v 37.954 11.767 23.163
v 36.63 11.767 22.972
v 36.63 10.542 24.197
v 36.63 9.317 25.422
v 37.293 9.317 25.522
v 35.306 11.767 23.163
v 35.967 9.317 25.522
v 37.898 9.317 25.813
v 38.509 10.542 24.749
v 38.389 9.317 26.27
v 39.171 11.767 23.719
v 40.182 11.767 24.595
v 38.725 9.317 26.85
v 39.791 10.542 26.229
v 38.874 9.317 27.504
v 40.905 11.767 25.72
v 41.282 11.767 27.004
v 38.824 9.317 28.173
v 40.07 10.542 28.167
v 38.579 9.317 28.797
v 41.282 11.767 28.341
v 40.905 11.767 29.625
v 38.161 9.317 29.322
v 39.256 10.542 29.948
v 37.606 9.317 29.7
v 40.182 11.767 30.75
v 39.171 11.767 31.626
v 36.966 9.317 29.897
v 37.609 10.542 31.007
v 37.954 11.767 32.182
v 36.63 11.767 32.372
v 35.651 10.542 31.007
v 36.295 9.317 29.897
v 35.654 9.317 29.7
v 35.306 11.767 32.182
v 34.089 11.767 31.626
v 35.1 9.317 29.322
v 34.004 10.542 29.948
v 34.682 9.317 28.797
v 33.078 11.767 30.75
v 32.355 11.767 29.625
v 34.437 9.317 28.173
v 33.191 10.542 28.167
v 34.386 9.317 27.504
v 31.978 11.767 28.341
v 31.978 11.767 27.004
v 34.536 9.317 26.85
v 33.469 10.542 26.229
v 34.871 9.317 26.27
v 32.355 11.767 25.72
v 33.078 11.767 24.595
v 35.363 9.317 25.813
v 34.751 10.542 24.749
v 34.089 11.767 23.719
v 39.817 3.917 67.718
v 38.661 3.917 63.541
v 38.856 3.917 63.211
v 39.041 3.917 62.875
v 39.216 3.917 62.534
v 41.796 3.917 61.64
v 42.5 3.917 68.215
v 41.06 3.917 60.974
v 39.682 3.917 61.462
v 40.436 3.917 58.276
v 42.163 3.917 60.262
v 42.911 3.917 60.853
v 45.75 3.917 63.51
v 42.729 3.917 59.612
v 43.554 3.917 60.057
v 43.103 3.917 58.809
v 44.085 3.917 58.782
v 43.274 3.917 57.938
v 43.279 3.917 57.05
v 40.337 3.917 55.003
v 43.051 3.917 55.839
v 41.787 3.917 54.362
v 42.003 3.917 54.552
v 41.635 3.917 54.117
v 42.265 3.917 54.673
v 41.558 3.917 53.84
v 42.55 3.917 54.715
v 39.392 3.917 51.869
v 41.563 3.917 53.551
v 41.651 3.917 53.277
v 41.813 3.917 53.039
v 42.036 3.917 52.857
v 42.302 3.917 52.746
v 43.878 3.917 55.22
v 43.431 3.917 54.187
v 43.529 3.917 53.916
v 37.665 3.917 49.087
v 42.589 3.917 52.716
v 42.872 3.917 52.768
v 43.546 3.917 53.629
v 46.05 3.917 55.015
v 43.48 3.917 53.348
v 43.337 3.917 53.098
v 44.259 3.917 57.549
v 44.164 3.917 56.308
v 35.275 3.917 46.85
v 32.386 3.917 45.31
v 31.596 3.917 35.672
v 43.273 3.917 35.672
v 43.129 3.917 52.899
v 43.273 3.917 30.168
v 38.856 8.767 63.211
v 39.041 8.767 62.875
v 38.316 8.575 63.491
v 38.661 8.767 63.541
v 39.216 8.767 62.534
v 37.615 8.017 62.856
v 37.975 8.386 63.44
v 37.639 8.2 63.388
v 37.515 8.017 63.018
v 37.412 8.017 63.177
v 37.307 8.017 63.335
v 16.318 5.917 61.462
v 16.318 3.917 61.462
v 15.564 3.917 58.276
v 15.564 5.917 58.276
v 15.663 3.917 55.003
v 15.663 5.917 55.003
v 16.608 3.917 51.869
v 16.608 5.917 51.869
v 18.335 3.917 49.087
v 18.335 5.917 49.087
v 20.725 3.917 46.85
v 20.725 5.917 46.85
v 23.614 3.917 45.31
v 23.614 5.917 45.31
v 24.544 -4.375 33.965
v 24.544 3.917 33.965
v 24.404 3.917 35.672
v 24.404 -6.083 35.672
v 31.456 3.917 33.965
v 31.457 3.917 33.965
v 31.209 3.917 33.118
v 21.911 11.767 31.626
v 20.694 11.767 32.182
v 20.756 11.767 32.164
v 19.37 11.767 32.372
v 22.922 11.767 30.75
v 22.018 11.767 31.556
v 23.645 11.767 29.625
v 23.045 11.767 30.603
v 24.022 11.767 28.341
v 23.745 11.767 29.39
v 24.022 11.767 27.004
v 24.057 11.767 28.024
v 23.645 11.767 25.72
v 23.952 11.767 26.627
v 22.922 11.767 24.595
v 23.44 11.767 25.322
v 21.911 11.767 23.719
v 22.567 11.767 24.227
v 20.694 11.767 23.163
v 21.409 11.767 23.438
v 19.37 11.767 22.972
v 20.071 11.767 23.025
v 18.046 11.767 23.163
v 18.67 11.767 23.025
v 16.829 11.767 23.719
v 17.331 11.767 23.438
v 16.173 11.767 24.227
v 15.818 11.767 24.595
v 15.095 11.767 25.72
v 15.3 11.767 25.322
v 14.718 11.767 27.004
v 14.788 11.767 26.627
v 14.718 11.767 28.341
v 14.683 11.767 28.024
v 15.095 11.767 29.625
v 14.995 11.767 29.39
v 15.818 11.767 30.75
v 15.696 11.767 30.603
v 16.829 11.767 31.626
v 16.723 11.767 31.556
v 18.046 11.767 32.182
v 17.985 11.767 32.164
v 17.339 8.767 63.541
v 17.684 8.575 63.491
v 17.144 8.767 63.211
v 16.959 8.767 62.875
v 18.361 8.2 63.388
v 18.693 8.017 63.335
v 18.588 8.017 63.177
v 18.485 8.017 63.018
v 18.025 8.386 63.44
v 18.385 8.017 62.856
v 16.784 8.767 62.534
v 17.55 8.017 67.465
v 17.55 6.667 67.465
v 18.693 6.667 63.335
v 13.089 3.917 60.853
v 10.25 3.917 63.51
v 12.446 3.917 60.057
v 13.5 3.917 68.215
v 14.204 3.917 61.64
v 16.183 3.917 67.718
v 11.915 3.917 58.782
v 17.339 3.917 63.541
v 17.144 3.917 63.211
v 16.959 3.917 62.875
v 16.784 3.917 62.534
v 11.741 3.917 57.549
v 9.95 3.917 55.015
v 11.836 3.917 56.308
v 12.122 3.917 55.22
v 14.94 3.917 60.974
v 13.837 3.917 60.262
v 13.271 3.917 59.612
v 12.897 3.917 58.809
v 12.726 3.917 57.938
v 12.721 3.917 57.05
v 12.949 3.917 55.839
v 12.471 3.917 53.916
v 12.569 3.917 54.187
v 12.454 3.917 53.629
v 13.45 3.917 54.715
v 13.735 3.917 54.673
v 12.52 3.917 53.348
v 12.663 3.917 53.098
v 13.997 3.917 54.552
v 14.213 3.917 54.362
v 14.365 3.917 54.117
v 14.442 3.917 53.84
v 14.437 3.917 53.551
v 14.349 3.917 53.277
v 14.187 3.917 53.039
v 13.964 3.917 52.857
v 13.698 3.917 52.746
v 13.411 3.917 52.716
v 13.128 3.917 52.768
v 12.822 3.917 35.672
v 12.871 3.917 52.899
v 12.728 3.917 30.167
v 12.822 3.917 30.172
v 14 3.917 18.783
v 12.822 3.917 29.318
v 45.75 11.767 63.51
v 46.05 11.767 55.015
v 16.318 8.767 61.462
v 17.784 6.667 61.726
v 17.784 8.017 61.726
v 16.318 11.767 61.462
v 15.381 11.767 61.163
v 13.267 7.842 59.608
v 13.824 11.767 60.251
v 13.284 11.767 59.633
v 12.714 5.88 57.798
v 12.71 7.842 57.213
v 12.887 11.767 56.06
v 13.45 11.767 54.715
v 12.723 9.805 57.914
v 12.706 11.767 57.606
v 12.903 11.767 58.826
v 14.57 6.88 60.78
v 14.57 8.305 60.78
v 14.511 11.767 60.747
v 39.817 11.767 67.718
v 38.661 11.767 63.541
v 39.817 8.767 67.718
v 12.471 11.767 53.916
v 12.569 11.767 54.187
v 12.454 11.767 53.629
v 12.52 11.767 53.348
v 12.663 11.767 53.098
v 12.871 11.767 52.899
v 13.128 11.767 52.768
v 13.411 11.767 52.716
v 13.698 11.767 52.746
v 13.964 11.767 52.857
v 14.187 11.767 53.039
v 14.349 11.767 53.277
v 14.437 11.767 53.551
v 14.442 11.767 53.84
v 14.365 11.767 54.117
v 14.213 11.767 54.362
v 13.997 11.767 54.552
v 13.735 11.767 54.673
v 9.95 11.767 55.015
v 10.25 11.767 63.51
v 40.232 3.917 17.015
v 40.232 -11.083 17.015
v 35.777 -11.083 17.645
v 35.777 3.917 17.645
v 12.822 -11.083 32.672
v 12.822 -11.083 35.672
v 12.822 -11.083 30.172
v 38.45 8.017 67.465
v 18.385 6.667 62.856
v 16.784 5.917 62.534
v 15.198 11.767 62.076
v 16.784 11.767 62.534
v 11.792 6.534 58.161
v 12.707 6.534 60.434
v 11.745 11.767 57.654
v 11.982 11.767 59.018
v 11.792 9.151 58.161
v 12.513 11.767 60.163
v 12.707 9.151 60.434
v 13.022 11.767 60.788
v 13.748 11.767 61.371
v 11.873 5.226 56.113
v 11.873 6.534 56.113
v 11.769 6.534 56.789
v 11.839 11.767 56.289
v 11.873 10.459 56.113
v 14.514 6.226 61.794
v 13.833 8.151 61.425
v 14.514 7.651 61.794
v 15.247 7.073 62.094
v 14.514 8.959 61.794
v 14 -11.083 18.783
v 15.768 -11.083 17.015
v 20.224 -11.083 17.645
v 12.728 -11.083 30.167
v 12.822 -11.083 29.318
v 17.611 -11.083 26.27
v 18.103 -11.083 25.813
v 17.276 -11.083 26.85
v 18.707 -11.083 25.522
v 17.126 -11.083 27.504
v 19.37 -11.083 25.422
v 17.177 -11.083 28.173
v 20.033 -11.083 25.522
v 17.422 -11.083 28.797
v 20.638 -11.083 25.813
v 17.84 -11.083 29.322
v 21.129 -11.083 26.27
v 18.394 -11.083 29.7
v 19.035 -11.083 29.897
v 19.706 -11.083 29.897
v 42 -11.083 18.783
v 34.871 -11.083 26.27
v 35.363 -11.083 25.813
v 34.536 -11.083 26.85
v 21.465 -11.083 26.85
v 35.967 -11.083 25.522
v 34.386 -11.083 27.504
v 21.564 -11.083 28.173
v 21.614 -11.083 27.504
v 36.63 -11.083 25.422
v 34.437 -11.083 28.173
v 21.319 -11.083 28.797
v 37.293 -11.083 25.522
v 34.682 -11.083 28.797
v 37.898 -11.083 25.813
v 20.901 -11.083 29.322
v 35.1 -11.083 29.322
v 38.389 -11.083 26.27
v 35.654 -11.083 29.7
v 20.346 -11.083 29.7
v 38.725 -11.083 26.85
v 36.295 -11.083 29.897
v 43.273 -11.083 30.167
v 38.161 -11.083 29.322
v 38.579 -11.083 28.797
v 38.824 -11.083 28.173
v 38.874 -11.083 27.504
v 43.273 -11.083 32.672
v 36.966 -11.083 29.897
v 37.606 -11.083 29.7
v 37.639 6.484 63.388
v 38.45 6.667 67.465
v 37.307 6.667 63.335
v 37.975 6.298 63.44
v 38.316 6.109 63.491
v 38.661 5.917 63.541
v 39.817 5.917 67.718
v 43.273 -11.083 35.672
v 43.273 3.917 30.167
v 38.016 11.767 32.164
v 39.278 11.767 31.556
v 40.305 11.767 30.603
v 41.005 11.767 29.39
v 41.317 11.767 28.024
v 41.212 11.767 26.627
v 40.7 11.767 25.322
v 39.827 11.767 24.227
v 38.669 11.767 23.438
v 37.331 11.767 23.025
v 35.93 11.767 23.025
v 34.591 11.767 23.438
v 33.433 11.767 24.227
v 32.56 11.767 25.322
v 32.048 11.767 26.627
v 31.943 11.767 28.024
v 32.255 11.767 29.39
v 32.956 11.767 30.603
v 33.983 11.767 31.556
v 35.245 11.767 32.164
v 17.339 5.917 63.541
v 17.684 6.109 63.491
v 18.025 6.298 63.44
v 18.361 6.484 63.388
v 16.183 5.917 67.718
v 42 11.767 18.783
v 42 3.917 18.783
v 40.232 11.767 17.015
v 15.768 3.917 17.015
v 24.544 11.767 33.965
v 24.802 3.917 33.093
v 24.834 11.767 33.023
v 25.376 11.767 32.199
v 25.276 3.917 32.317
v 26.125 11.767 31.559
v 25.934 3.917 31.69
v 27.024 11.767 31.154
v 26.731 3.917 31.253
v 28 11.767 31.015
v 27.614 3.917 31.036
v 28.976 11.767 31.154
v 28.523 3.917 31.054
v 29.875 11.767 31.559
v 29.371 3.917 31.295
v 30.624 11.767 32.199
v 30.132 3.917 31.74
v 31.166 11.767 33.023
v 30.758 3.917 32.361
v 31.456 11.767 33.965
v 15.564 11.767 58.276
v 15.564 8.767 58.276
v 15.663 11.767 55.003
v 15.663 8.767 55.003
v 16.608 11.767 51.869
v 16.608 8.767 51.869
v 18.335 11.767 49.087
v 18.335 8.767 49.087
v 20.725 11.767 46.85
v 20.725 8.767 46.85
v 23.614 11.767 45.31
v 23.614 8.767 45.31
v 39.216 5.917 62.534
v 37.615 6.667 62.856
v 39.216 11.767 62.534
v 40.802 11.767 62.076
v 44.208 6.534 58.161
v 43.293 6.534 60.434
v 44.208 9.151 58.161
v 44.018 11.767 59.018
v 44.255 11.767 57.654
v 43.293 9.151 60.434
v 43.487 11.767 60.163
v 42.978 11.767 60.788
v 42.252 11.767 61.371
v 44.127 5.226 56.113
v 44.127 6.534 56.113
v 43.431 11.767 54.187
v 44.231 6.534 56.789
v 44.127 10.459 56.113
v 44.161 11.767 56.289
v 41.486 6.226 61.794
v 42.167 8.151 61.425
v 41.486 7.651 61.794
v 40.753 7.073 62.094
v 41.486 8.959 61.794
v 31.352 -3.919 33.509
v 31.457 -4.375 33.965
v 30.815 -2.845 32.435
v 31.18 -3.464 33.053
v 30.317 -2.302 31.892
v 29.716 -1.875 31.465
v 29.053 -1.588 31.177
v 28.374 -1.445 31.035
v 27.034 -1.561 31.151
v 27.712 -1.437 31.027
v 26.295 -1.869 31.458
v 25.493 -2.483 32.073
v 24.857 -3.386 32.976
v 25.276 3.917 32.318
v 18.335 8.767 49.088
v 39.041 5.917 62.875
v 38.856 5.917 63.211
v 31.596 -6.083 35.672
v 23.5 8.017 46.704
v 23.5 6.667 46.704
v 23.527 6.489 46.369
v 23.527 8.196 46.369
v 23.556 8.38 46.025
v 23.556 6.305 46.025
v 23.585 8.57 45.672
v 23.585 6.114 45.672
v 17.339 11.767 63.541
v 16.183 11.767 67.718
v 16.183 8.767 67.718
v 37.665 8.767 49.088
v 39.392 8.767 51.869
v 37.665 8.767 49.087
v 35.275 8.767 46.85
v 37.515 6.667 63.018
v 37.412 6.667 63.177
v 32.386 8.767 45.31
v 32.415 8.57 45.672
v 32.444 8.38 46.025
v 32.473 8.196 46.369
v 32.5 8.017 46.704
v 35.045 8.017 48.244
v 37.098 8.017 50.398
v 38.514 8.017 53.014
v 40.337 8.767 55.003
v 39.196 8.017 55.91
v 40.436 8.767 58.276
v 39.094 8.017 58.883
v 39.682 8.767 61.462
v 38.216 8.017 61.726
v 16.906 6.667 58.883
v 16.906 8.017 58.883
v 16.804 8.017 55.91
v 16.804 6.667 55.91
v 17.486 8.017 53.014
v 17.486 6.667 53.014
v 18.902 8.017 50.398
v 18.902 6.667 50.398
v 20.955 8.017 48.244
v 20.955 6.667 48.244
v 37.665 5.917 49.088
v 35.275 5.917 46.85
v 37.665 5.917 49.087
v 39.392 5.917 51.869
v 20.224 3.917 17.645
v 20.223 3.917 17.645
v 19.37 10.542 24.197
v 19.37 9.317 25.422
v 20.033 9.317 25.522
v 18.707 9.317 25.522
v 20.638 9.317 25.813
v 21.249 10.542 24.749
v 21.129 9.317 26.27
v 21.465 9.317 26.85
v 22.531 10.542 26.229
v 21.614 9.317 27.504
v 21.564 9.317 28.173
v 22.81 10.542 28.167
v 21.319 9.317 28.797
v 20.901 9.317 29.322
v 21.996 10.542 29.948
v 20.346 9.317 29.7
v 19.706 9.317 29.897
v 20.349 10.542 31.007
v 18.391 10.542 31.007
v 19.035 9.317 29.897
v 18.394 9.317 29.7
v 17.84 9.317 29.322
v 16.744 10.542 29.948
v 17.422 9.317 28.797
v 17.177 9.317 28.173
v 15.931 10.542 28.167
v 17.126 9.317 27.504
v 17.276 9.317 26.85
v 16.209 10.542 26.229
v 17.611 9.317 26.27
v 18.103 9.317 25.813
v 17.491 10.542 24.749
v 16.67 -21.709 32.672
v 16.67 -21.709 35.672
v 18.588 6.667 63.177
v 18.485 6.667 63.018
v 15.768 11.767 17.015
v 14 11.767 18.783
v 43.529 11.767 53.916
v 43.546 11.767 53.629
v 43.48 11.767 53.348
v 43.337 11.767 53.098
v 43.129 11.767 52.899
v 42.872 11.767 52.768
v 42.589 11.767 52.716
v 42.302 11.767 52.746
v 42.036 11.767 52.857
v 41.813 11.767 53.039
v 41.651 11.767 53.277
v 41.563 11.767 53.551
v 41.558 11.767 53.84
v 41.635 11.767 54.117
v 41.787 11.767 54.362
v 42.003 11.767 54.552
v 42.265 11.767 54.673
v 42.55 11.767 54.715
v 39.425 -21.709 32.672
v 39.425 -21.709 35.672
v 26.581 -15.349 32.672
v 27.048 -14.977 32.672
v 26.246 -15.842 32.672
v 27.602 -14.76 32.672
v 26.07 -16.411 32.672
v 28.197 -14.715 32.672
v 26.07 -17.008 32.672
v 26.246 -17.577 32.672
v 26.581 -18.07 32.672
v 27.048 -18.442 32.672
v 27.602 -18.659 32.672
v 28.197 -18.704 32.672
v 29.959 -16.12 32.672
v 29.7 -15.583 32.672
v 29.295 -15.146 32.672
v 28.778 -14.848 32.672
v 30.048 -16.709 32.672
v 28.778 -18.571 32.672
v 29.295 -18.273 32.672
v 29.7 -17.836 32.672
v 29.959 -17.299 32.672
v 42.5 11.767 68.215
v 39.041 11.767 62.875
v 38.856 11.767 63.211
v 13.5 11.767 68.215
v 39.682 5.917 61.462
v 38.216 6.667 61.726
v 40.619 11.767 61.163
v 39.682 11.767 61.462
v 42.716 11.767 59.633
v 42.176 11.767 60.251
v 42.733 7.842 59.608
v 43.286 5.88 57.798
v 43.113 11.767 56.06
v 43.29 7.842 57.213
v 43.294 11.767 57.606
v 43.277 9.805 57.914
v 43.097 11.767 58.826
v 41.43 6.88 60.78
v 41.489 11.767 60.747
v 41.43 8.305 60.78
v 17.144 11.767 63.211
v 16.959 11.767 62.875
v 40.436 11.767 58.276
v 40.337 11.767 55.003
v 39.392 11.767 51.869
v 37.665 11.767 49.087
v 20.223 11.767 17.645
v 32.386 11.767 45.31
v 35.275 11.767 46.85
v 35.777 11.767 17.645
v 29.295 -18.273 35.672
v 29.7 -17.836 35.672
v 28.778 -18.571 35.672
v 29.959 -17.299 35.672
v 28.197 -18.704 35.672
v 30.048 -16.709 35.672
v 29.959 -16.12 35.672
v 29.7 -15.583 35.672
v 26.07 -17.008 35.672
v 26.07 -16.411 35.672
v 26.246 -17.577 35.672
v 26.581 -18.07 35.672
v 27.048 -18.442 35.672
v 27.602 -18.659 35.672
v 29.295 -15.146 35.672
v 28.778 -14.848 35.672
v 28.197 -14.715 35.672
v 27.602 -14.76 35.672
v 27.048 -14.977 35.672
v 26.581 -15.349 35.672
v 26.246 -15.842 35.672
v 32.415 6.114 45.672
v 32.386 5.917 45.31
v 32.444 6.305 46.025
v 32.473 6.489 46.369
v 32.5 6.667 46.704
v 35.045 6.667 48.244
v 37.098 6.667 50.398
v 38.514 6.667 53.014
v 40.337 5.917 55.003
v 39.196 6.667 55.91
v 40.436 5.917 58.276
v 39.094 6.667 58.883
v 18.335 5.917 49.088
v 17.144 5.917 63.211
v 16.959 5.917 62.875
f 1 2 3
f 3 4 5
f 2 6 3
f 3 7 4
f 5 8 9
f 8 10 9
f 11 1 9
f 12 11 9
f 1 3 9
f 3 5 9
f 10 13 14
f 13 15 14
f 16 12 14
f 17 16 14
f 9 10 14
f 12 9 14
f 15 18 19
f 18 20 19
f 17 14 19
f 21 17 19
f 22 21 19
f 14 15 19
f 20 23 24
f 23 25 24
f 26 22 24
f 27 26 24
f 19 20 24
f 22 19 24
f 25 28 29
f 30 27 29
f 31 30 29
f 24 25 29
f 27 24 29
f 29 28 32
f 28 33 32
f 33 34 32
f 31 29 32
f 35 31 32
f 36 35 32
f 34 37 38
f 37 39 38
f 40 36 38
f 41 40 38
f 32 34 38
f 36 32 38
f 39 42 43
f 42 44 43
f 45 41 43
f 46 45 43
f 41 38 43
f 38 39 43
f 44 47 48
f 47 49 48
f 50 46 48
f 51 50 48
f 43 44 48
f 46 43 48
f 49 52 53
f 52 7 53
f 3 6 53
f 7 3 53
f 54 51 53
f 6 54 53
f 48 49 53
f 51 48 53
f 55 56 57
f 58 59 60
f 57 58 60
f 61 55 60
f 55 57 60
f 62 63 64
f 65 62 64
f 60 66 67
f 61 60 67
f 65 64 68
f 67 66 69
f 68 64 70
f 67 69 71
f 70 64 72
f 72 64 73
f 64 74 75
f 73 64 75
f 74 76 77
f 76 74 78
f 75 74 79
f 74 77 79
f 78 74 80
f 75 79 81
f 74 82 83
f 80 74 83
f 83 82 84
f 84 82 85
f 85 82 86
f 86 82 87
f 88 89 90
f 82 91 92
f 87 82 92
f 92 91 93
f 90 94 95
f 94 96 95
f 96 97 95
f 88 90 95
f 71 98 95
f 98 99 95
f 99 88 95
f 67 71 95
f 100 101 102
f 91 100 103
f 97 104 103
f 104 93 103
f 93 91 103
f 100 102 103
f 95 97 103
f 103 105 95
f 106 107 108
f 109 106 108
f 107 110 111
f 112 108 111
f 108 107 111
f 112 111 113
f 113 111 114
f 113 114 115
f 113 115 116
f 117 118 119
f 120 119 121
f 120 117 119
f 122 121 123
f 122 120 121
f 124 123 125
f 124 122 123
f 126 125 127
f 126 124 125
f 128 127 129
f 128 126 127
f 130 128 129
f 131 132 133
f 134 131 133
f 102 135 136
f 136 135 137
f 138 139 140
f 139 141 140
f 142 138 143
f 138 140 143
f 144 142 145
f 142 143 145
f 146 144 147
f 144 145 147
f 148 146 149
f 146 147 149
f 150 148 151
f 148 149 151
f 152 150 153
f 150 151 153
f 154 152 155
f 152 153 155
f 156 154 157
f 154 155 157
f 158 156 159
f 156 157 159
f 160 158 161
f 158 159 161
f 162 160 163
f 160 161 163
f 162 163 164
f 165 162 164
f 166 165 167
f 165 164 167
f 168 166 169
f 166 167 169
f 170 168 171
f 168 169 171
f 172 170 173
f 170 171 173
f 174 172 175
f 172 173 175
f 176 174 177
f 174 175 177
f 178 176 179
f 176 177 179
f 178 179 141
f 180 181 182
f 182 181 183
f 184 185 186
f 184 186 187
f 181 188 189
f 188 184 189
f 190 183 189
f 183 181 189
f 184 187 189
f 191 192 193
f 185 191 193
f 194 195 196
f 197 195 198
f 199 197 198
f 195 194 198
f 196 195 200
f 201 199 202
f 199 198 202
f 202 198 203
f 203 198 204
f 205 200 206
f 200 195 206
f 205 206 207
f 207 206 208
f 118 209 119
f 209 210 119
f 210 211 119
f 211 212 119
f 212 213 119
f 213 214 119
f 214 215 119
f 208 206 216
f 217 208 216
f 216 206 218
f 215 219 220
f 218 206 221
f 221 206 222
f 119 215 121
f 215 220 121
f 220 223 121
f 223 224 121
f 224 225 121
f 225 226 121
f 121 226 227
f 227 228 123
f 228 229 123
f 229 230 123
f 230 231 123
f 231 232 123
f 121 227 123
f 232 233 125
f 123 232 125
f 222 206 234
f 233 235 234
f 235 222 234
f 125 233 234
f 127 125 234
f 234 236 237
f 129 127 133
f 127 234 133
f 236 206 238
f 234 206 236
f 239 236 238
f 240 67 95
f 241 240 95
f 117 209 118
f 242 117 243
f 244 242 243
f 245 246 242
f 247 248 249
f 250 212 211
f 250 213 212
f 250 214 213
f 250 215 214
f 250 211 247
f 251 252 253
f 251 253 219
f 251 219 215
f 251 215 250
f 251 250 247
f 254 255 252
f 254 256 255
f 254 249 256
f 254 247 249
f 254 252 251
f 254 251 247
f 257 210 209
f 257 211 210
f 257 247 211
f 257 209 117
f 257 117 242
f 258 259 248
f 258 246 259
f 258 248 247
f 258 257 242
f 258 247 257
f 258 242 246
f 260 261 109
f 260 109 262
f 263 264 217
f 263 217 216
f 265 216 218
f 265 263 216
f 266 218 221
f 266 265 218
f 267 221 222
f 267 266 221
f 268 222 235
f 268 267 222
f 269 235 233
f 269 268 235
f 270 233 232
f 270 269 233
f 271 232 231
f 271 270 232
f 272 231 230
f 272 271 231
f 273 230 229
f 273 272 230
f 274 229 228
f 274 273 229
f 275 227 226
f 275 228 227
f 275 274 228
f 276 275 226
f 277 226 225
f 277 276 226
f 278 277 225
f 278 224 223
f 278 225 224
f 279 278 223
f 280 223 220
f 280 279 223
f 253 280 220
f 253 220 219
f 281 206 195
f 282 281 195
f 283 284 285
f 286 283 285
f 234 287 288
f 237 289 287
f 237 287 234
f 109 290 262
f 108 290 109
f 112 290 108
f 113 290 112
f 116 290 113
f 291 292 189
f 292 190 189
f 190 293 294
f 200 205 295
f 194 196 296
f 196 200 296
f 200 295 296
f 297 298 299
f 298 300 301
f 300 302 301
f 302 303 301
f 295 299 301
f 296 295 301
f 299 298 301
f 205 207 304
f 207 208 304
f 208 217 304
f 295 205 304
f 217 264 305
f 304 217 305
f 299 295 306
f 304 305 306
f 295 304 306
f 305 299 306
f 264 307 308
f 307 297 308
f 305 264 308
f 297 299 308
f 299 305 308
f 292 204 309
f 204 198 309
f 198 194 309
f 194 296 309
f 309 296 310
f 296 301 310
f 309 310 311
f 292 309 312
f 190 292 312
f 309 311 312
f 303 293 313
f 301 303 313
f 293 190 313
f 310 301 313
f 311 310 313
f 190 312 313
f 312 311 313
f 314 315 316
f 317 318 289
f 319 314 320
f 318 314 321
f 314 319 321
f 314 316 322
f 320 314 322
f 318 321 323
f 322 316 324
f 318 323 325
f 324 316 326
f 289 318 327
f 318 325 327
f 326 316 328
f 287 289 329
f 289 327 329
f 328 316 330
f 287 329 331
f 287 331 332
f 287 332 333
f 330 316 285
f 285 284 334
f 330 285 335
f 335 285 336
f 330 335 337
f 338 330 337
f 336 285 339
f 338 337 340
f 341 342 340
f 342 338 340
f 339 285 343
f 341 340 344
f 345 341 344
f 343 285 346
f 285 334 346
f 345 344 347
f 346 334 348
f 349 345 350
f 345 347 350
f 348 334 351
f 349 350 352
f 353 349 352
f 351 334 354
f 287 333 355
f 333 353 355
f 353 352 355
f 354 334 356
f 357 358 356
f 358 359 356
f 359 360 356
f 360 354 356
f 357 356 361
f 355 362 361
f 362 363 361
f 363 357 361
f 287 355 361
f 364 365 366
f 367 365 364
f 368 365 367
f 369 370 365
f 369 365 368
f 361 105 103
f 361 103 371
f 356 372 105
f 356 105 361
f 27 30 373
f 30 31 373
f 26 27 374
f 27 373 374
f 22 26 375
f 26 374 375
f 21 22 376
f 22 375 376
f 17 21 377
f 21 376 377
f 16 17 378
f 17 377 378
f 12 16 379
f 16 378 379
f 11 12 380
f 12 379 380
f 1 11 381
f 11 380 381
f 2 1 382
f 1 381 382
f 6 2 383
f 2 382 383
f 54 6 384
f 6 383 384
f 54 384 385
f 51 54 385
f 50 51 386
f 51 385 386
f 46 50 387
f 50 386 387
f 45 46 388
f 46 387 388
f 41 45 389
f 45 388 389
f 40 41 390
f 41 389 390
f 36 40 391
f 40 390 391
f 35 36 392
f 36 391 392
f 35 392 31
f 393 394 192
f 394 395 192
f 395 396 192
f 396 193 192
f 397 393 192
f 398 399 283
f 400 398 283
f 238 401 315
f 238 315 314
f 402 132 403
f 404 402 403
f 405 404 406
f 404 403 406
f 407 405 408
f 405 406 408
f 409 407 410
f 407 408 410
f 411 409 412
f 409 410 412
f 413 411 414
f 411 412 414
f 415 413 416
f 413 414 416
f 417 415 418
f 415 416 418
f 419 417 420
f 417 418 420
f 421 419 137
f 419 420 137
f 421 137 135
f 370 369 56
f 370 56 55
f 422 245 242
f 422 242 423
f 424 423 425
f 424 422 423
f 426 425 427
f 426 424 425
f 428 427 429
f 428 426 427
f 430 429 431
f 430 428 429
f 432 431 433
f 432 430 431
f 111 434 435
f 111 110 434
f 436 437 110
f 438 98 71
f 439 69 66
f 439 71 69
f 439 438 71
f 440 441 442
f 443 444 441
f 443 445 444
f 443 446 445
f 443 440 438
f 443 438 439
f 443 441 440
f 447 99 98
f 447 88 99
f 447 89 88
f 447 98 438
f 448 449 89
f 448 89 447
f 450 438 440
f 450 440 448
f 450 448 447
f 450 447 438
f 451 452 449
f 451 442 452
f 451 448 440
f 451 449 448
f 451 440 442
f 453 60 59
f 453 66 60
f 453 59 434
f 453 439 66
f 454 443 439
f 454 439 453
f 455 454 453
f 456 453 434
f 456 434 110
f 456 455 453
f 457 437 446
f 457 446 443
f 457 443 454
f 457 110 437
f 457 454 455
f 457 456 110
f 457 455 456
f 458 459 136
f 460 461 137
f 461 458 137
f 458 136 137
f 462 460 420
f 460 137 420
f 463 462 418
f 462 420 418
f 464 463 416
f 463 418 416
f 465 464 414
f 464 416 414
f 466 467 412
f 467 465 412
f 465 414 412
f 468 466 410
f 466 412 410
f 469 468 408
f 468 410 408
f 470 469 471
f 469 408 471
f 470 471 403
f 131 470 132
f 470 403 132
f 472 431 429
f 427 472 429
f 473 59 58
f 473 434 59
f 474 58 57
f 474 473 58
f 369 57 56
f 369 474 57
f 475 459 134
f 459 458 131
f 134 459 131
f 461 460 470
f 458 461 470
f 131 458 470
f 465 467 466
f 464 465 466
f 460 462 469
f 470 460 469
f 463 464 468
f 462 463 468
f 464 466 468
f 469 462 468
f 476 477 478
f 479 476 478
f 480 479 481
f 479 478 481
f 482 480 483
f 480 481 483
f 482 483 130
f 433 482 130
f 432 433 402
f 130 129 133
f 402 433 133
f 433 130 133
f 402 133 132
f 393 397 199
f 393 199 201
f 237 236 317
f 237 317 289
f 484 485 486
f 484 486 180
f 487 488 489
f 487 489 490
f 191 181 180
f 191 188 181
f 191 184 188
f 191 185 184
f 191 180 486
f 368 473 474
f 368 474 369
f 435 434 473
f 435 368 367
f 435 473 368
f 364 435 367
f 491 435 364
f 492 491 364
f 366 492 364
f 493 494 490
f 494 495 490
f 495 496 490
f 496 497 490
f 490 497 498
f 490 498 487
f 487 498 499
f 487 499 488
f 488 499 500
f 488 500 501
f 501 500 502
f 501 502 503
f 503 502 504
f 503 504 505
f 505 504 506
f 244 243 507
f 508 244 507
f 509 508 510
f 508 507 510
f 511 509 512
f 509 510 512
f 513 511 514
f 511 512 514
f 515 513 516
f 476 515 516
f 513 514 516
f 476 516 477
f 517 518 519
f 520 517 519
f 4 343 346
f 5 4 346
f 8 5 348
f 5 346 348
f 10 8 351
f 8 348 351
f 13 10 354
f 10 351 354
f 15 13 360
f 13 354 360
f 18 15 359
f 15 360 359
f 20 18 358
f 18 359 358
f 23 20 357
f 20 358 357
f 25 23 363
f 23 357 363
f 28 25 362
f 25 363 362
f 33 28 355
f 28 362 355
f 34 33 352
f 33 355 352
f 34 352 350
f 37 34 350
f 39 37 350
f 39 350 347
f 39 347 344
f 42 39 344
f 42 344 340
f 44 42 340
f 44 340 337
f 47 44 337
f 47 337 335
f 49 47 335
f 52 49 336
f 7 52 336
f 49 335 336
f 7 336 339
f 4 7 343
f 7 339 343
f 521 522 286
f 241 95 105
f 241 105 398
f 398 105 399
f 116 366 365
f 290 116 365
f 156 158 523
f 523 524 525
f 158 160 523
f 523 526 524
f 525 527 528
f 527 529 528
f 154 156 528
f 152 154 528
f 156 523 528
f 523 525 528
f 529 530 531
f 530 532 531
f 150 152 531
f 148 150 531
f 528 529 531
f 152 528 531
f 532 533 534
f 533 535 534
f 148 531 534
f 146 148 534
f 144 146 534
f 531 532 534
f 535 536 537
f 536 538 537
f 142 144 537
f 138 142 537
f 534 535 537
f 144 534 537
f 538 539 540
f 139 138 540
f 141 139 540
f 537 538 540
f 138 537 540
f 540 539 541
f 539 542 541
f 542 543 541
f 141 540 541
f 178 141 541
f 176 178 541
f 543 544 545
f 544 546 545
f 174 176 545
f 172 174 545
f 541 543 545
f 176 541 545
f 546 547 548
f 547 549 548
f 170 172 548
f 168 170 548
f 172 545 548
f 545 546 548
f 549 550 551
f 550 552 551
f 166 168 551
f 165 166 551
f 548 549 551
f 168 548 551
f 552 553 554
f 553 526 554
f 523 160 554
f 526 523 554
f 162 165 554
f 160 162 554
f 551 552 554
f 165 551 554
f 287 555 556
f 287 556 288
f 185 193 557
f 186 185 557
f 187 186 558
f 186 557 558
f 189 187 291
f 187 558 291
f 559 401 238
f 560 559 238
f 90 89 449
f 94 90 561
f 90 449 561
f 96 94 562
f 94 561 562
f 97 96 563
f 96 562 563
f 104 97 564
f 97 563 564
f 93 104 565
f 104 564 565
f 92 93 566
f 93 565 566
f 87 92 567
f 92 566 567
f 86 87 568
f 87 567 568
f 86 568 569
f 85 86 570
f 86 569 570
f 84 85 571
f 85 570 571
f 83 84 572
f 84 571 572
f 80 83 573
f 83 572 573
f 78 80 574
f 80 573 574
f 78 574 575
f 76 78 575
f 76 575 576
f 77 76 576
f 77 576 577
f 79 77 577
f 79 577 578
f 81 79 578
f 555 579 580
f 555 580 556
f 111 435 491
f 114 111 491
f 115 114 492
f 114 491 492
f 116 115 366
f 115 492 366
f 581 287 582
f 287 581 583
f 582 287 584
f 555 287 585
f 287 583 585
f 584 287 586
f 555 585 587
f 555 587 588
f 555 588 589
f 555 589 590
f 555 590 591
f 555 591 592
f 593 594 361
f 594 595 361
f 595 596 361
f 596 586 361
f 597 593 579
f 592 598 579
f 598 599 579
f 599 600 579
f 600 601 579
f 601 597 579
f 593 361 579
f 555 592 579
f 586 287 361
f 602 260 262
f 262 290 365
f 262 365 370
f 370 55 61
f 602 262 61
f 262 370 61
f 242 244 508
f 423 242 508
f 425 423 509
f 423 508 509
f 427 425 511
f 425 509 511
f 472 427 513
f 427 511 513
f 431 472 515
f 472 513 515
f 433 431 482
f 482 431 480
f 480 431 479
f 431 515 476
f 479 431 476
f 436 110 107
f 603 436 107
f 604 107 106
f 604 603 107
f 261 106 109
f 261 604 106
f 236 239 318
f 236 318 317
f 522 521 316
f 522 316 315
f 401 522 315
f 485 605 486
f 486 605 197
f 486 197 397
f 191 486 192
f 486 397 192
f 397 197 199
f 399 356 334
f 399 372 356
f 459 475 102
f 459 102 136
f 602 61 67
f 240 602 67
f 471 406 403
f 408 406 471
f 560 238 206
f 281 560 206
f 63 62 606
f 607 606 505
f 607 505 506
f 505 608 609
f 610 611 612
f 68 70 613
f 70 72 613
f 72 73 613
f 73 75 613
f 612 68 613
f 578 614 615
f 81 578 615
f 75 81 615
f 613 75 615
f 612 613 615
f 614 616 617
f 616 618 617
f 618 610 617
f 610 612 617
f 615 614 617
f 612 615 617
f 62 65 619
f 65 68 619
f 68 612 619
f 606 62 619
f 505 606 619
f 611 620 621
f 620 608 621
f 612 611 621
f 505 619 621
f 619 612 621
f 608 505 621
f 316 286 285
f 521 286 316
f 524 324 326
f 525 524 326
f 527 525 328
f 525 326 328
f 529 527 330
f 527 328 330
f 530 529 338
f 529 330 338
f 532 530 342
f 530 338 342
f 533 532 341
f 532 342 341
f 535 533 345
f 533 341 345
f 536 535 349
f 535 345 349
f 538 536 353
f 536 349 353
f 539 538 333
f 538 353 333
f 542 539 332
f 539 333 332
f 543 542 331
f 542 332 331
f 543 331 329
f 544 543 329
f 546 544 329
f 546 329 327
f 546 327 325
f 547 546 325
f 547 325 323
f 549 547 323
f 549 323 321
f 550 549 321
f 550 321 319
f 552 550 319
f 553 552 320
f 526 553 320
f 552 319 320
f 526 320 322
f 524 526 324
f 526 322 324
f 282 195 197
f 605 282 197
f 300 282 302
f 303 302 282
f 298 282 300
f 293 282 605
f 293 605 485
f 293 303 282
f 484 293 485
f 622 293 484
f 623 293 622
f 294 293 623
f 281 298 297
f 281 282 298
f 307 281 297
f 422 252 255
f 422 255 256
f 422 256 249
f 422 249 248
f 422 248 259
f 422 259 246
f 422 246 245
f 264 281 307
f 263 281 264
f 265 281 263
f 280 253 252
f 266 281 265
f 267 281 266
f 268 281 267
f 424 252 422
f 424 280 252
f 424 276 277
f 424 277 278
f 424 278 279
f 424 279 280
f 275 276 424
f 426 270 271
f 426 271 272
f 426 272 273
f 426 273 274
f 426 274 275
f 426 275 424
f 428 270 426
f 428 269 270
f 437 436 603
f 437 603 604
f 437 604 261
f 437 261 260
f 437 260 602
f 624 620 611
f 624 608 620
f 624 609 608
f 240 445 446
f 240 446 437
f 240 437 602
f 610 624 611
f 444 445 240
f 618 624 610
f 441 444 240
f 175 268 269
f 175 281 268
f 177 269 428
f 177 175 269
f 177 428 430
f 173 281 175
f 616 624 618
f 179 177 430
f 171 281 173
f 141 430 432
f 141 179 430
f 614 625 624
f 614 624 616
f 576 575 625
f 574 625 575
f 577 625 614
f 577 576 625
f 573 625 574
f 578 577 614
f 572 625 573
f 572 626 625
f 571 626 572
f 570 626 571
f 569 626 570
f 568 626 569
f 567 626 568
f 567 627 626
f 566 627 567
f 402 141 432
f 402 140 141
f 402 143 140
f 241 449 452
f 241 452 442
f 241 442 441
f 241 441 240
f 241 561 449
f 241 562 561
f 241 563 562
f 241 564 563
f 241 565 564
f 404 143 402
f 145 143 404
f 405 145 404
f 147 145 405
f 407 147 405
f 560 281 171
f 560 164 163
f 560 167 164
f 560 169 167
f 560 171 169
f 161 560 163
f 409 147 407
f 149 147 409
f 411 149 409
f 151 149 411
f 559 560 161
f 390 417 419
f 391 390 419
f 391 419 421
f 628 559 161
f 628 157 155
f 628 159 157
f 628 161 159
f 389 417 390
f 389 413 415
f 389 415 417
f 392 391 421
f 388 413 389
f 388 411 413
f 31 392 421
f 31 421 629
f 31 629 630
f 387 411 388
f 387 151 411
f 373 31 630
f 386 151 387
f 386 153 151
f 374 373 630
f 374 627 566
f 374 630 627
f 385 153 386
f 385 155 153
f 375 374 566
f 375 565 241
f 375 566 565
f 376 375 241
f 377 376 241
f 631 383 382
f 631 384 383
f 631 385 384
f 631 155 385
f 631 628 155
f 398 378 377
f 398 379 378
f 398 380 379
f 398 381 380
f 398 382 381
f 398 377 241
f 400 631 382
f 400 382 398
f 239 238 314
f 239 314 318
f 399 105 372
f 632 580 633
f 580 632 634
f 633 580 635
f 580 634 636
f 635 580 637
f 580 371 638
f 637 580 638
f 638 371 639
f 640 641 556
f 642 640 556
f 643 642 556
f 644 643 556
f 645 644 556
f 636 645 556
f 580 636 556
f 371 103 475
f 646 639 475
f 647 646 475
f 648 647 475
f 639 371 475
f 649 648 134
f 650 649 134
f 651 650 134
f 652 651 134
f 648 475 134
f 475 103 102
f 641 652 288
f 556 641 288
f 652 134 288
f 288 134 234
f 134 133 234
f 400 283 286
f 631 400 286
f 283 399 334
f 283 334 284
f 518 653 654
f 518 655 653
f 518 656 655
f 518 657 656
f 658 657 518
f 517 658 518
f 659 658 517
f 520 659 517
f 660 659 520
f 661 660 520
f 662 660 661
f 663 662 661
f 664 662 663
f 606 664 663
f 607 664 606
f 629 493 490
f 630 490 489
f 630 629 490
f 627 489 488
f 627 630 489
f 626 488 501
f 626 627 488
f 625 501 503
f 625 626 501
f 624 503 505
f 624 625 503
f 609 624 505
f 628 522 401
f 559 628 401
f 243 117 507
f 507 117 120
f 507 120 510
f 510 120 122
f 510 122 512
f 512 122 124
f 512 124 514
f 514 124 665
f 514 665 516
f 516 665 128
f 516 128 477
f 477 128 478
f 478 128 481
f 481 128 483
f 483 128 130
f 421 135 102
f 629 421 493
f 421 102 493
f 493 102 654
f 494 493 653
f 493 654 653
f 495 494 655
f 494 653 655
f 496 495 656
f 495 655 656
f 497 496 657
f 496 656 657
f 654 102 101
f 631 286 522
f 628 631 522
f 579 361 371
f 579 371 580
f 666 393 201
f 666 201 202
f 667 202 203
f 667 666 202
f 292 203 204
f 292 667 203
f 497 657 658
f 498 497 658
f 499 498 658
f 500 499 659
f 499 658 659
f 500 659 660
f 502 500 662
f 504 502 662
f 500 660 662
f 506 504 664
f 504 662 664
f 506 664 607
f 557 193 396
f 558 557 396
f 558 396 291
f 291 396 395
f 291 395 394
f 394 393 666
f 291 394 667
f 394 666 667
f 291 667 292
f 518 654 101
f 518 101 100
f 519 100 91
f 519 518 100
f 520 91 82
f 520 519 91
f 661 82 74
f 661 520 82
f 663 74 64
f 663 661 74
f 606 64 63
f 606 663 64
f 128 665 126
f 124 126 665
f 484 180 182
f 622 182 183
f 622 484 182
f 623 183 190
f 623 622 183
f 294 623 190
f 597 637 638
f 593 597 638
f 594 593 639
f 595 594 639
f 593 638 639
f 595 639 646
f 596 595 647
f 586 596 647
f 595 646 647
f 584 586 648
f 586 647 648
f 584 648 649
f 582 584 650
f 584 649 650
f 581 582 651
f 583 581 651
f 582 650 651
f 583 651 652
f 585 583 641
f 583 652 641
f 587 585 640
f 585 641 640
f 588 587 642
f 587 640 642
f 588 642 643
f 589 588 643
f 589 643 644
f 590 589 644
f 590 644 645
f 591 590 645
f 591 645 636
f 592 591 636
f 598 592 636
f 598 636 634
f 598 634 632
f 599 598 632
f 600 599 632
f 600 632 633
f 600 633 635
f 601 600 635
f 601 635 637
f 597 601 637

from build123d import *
from OCP.BRepFilletAPI import BRepFilletAPI_MakeChamfer

# Parameters (mm, degrees)
EXTRUDE_1_DEPTH                                 = 15.7
CUT_EXTRUDE_5_DEPTH                             = 6
CUT_EXTRUDE_START                               = -4
CUT_EXTRUDE_6_DEPTH                             = 4
CHAMFER_2_SIZE                                  = 2.5
CHAMFER_2_SIZE_2                                = 1.5
CHAMFER_3_SIZE                                  = 2.5
CHAMFER_3_SIZE_2                                = 1.5
CHAMFER_4_SIZE                                  = 2.5
CHAMFER_4_SIZE_2                                = 1.5
CHAMFER_5_SIZE                                  = 1.5
CHAMFER_5_SIZE_2                                = 2.5
CUT_EXTRUDE_7_DEPTH                             = 20
SCALE1_SCALE                                    = 0.5
BOSS_EXTRUDE2_DEPTH                             = 15
CSK_FOR_M4_FLAT_HEAD_MACHINE_SCREW1_D           = 4.5
CSK_FOR_M4_FLAT_HEAD_MACHINE_SCREW1_DEPTH       = 28.648063607
CSK_FOR_M4_FLAT_HEAD_MACHINE_SCREW1_CSINK_D     = 9.4
CSK_FOR_M4_FLAT_HEAD_MACHINE_SCREW1_CSINK_ANGLE = 90
CSK_FOR_M4_FLAT_HEAD_MACHINE_SCREW1_TIP         = 1.351936393
BOSS_EXTRUDE3_DEPTH                             = 3
BOSS_EXTRUDE3_DEPTH_BACK                        = 2.50573
CUT_EXTRUDE1_DEPTH                              = 79.961726409
CUT_EXTRUDE2_DEPTH                              = 5
CHAMFER1_START                                  = -1.425343225
CHAMFER1_DEPTH                                  = 0.342542044
CHAMFER1_START_2                                = -6.082801281
CHAMFER1_2_DEPTH                                = 4.657458056
CHAMFER1_START_3                                = 17
CHAMFER1_3_DEPTH                                = 3.923043383
CUT_EXTRUDE3_REACH                              = 62.423
SKETCH9_R                                       = 2


with BuildPart() as part:
    # Эскиз1 → Бобышка-Вытянуть1 (new body)
    with BuildSketch(Plane(origin=(0, 0, 0), x_dir=(1, 0, 0), z_dir=(0, 1, 0))):
        with BuildLine():
            Line((19, -55.842875467), (21.087010541, -30.364203971))
            ThreePointArc((21.087010541, -30.364203971), (28, -24.464466094), (34.912989459, -30.364203971))
            Line((34.912989459, -30.364203971), (37, -55.842875467))
            ThreePointArc((37, -55.842875467), (49.615065571, -70.216351148), (46.614482007, -89.103732671))
            Line((46.614482007, -89.103732671), (48.9, -97.364070254))
            Line((48.9, -97.364070254), (57, -98.864070254))
            Line((57, -98.864070254), (63.5, -89.453874559))
            Line((63.5, -89.453874559), (64.1, -72.464466094))
            Line((64.1, -72.464466094), (56, 0))
            Line((56, 0), (52.464466094, 3.535533906))
            Line((52.464466094, 3.535533906), (43.553055011, 2.275870258))
            Line((43.553055011, 2.275870258), (12.446944989, 2.275870258))
            Line((12.446944989, 2.275870258), (3.535533906, 3.535533906))
            Line((3.535533906, 3.535533906), (0, 0))
            Line((0, 0), (-8.1, -72.464466094))
            Line((-8.1, -72.464466094), (-7.5, -89.453874559))
            Line((-7.5, -89.453874559), (-1, -98.864070254))
            Line((-1, -98.864070254), (7.1, -97.364070254))
            Line((7.1, -97.364070254), (9.385517993, -89.103732671))
            ThreePointArc((9.385517993, -89.103732671), (6.384934429, -70.216351148), (19, -55.842875467))
        make_face()
    extrude(amount=EXTRUDE_1_DEPTH)

    # Эскиз9 → Вырез-Вытянуть5 (cut)
    with BuildSketch(Plane(origin=(0, 15.7, 0), x_dir=(1, 0, 0), z_dir=(0, 1, 0))):
        with BuildLine():
            Line((4.070420212, -98.938601985), (6.67745221, -89.516245887))
            ThreePointArc((6.67745221, -89.516245887), (28, -51.464466094), (49.32254779, -89.516245887))
            Line((49.32254779, -89.516245887), (51.928879153, -98.936069744))
            Line((51.928879153, -98.936069744), (4.070420212, -98.938601985))
        make_face()
    extrude(amount=-CUT_EXTRUDE_5_DEPTH, mode=Mode.SUBTRACT)

    # Эскиз10 → Вырез-Вытянуть6 (cut)
    with BuildSketch(Plane.XZ.offset(CUT_EXTRUDE_START)):
        with BuildLine():
            Line((49.32254779, 89.516245887), (52.714892846, 101.77688678))
            Line((52.714892846, 101.77688678), (2.982429051, 102.870828422))
            Line((2.982429051, 102.870828422), (6.67745221, 89.516245887))
            ThreePointArc((6.67745221, 89.516245887), (28, 51.464466094), (49.32254779, 89.516245887))
        make_face()
    extrude(amount=CUT_EXTRUDE_6_DEPTH, mode=Mode.SUBTRACT)

    # Фаска2
    chamfer_2_edges_1 = [part.edges().sort_by_distance(p)[0] for p in [
        (8.242758997, 9.7, 93.233901463),
    ]]
    chamfer_2_side_1 = [part.faces().sort_by_distance(p)[0] for p in [
        (8.213845332, 9.7, 93.225901463),
    ]]
    chamfer_2_edges_2 = [part.edges().sort_by_distance(p)[0] for p in [
        (6.384934429, 9.7, 70.216351148),
    ]]
    chamfer_2_side_2 = [part.faces().sort_by_distance(p)[0] for p in [
        (6.356114342, 9.7, 70.208020328),
    ]]
    chamfer_2 = BRepFilletAPI_MakeChamfer(part.part.solid().wrapped)
    for e in chamfer_2_edges_1:
        chamfer_2.Add(CHAMFER_2_SIZE - 0.0001, CHAMFER_2_SIZE_2 - 0.0001, e.wrapped, chamfer_2_side_1[0].wrapped)
    for e in chamfer_2_edges_2:
        chamfer_2.Add(CHAMFER_2_SIZE - 0.0001, CHAMFER_2_SIZE_2 - 0.0001, e.wrapped, chamfer_2_side_2[0].wrapped)
    add(Compound.cast(chamfer_2.Shape()), mode=Mode.REPLACE)  # a hair under: the kernel refuses the full size

    # Фаска3
    chamfer_3_edges_1 = [part.edges().sort_by_distance(p)[0] for p in [
        (8.242758997, 4, 93.233901463),
    ]]
    chamfer_3_side_1 = [part.faces().sort_by_distance(p)[0] for p in [
        (8.213845332, 4, 93.225901463),
    ]]
    chamfer_3_edges_2 = [part.edges().sort_by_distance(p)[0] for p in [
        (6.384934429, 4, 70.216351148),
    ]]
    chamfer_3_side_2 = [part.faces().sort_by_distance(p)[0] for p in [
        (6.384934429, 4.03, 70.216351148),
    ]]
    chamfer_3 = BRepFilletAPI_MakeChamfer(part.part.solid().wrapped)
    for e in chamfer_3_edges_1:
        chamfer_3.Add(CHAMFER_3_SIZE - 0.0001, CHAMFER_3_SIZE_2 - 0.0001, e.wrapped, chamfer_3_side_1[0].wrapped)
    for e in chamfer_3_edges_2:
        chamfer_3.Add(CHAMFER_3_SIZE_2 - 0.0001, CHAMFER_3_SIZE - 0.0001, e.wrapped, chamfer_3_side_2[0].wrapped)
    add(Compound.cast(chamfer_3.Shape()), mode=Mode.REPLACE)  # a hair under: the kernel refuses the full size

    # Фаска4
    chamfer_4_edges_1 = [part.edges().sort_by_distance(p)[0] for p in [
        (47.757241003, 9.7, 93.233901463),
    ]]
    chamfer_4_side_1 = [part.faces().sort_by_distance(p)[0] for p in [
        (47.786154668, 9.7, 93.225901463),
    ]]
    chamfer_4_edges_2 = [part.edges().sort_by_distance(p)[0] for p in [
        (49.615065571, 9.7, 70.216351148),
    ]]
    chamfer_4_side_2 = [part.faces().sort_by_distance(p)[0] for p in [
        (49.643885658, 9.7, 70.208020328),
    ]]
    chamfer_4 = BRepFilletAPI_MakeChamfer(part.part.solid().wrapped)
    for e in chamfer_4_edges_1:
        chamfer_4.Add(CHAMFER_4_SIZE - 0.0001, CHAMFER_4_SIZE_2 - 0.0001, e.wrapped, chamfer_4_side_1[0].wrapped)
    for e in chamfer_4_edges_2:
        chamfer_4.Add(CHAMFER_4_SIZE - 0.0001, CHAMFER_4_SIZE_2 - 0.0001, e.wrapped, chamfer_4_side_2[0].wrapped)
    add(Compound.cast(chamfer_4.Shape()), mode=Mode.REPLACE)  # a hair under: the kernel refuses the full size

    # Фаска5
    chamfer_5_edges_1 = [part.edges().sort_by_distance(p)[0] for p in [
        (47.757241003, 4, 93.233901463),
    ]]
    chamfer_5_side_1 = [part.faces().sort_by_distance(p)[0] for p in [
        (47.757241003, 4.03, 93.233901463),
    ]]
    chamfer_5_edges_2 = [part.edges().sort_by_distance(p)[0] for p in [
        (49.615065571, 4, 70.216351148),
    ]]
    chamfer_5_side_2 = [part.faces().sort_by_distance(p)[0] for p in [
        (49.643885658, 4, 70.208020328),
    ]]
    chamfer_5 = BRepFilletAPI_MakeChamfer(part.part.solid().wrapped)
    for e in chamfer_5_edges_1:
        chamfer_5.Add(CHAMFER_5_SIZE - 0.0001, CHAMFER_5_SIZE_2 - 0.0001, e.wrapped, chamfer_5_side_1[0].wrapped)
    for e in chamfer_5_edges_2:
        chamfer_5.Add(CHAMFER_5_SIZE_2 - 0.0001, CHAMFER_5_SIZE - 0.0001, e.wrapped, chamfer_5_side_2[0].wrapped)
    add(Compound.cast(chamfer_5.Shape()), mode=Mode.REPLACE)  # a hair under: the kernel refuses the full size

    # Эскиз11 → Вырез-Вытянуть7 (cut)
    with BuildSketch(Plane(origin=(0, 15.7, 0), x_dir=(1, 0, 0), z_dir=(0, 1, 0))):
        with BuildLine():
            Line((46.426049473, -86.017959352), (46.012822205, -88.379258027))
            add(Edge.make_bspline(
                [(58.862726543, -70.808948625), (60.119619749, -73.228227212), (61.202001727, -77.673197621), (57.883666669, -86.609034293), (49.905997231, -87.608281842), (46.012822205, -88.379258027)],
                knots=[0, 0, 0, 0, 0.305163468, 0.487677304, 1, 1, 1, 1], degree=3))
            ThreePointArc((58.862726543, -70.808948625), (56.072808864, -68.148005462), (57.1, -71.864070254))
            add(Edge.make_bspline(
                [(57.1, -71.864070254), (58.73856603, -74.489449168), (59.890065943, -84.15910166), (49.798382886, -85.957388163), (46.426049473, -86.017959352)],
                knots=[0, 0, 0, 0, 0.454203244, 1, 1, 1, 1], degree=3))
        make_face()
        with BuildLine():
            Line((9.573950527, -86.017959352), (9.987177795, -88.379258027))
            add(Edge.make_bspline(
                [(-2.862726543, -70.808948625), (-4.119619749, -73.228227212), (-5.202001727, -77.673197621), (-1.883666669, -86.609034293), (6.094002769, -87.608281842), (9.987177795, -88.379258027)],
                knots=[0, 0, 0, 0, 0.305163468, 0.487677304, 1, 1, 1, 1], degree=3))
            ThreePointArc((-2.862726543, -70.808948625), (-0.072808864, -68.148005462), (-1.1, -71.864070254))
            add(Edge.make_bspline(
                [(-1.1, -71.864070254), (-2.73856603, -74.489449168), (-3.890065943, -84.15910166), (6.201617114, -85.957388163), (9.573950527, -86.017959352)],
                knots=[0, 0, 0, 0, 0.454203244, 1, 1, 1, 1], degree=3))
        make_face()
    extrude(amount=-CUT_EXTRUDE_7_DEPTH, mode=Mode.SUBTRACT)


with BuildPart() as part_1:
    # Scale1: scaled about (27.999999844, 7.834407948, 37.565488007)
    add(part.part.scale(SCALE1_SCALE).moved(Location((13.999999922, 3.917203974, 18.782744003))))


with BuildPart() as boss_extrude2_tool:
    # Sketch5 → Boss-Extrude2 (new body)
    with BuildSketch(Plane.XZ.offset(-3.917198819)):
        Polygon((15.767885362, 17.014994944), (14.000118409, 18.782761897), (12.822450363, 29.318451551), (12.727631466, 30.166723248), (28.000118409, 31.014994944), (43.272605352, 30.166723248), (42.000118409, 18.782761897), (40.232351456, 17.014994944), (35.776645915, 17.644826768), (20.223590904, 17.644826768), align=None)
    extrude(amount=BOSS_EXTRUDE2_DEPTH)


with BuildPart() as part_2:
    add(part_1.part)


with BuildPart() as part_3:
    # Boss-Extrude2: joined with boss_extrude2_tool
    add(part_2.part.fuse(boss_extrude2_tool.part, tol=0.00001))

    # CSK for M4 Flat Head Machine Screw1
    with Locations(Plane(origin=(19.370167772, 11.767198819, 27.6724529), x_dir=(0, 0, 1), z_dir=(0, 1, 0))):
        with Locations((0, 0), (0, 17.26)):
            CounterSinkHole(CSK_FOR_M4_FLAT_HEAD_MACHINE_SCREW1_D / 2, CSK_FOR_M4_FLAT_HEAD_MACHINE_SCREW1_CSINK_D / 2, depth=CSK_FOR_M4_FLAT_HEAD_MACHINE_SCREW1_DEPTH, counter_sink_angle=CSK_FOR_M4_FLAT_HEAD_MACHINE_SCREW1_CSINK_ANGLE)
            with Locations((0, 0, -(CSK_FOR_M4_FLAT_HEAD_MACHINE_SCREW1_DEPTH + CSK_FOR_M4_FLAT_HEAD_MACHINE_SCREW1_TIP / 2))):  # 118° drill point
                Cone(0, CSK_FOR_M4_FLAT_HEAD_MACHINE_SCREW1_D / 2, CSK_FOR_M4_FLAT_HEAD_MACHINE_SCREW1_TIP, mode=Mode.SUBTRACT)


with BuildPart() as boss_extrude3_tool:
    # Sketch6 → Boss-Extrude3 (new, two sides: drawn at the far end of the back side and taken through both)
    with BuildSketch(Plane.XY.offset(32.6724529).offset(-BOSS_EXTRUDE3_DEPTH_BACK)):
        Polygon((12.822450363, -11.082801181), (12.822450363, 3.917198819), (43.272605352, 3.917198819), (43.272605352, -11.082801181), (39.425133125, -21.709493147), (16.66992259, -21.709493147), align=None)
    extrude(amount=BOSS_EXTRUDE3_DEPTH + BOSS_EXTRUDE3_DEPTH_BACK)


with BuildPart() as part_4:
    add(part_3.part)


with BuildPart() as part_5:
    # Boss-Extrude3: joined with boss_extrude3_tool
    add(part_4.part.fuse(boss_extrude3_tool.part, tol=0.00001))

    # Sketch7 → Cut-Extrude1 (cut, through all)
    with BuildSketch(Plane(origin=(43.272605352, 0, 0), x_dir=(0, 0, -1), z_dir=(1, 0, 0))):
        Polygon((-32.6724529, -22.263045792), (-32.6724529, -12.082801181), (-32.6724529, -11.082801181), (-31.6724529, -11.082801181), (-27.1724529, -11.082801181), (-27.1724529, -22.263045792), align=None)
    extrude(amount=-CUT_EXTRUDE1_DEPTH, mode=Mode.SUBTRACT)

    # Sketch8 → Cut-Extrude2 (cut)
    with BuildSketch(Plane(origin=(0, 3.917198819, 0), x_dir=(1, 0, 0), z_dir=(0, 1, 0))):
        with BuildLine():
            Line((31.596485278, -35.6724529), (31.456613139, -33.964863882))
            ThreePointArc((31.456613139, -33.964863882), (28.000118409, -31.014994944), (24.54362368, -33.964863882))
            Line((24.54362368, -33.964863882), (24.403751541, -35.6724529))
            Line((24.403751541, -35.6724529), (31.596485278, -35.6724529))
        make_face()
    extrude(amount=-CUT_EXTRUDE2_DEPTH, mode=Mode.SUBTRACT)

    # Chamfer1: read off the stored shape, not the designer's step
    # Chamfer1 outline → Chamfer1 (cut)
    with BuildSketch(Plane(origin=(0, 0, 0), x_dir=(1, 0, 0), z_dir=(0, 1, 0)).offset(CHAMFER1_START)):
        with BuildLine():
            ThreePointArc((31.456613139, -33.964863882), (28.00011841, -31.014994944), (24.54362368, -33.964863882))
            Line((24.54362368, -33.964863882), (24.403751541, -35.6724529))
            Line((24.403751541, -35.6724529), (31.596485278, -35.6724529))
            Line((31.596485278, -35.6724529), (31.456613139, -33.964863882))
        make_face()
    extrude(amount=CHAMFER1_DEPTH, mode=Mode.SUBTRACT)

    # Chamfer1 2 outline → Chamfer1 2 (cut)
    with BuildSketch(Plane(origin=(0, 0, 0), x_dir=(1, 0, 0), z_dir=(0, 1, 0)).offset(CHAMFER1_START_2)):
        with BuildLine():
            ThreePointArc((31.456613139, -33.964863882), (28.00011841, -31.014994944), (24.54362368, -33.964863882))
            Line((24.54362368, -33.964863882), (24.403751541, -35.6724529))
            Line((24.403751541, -35.6724529), (31.596485278, -35.6724529))
            Line((31.596485278, -35.6724529), (31.456613139, -33.964863882))
        make_face()
    extrude(amount=CHAMFER1_2_DEPTH, mode=Mode.SUBTRACT)

    # Chamfer1 3 outline → Chamfer1 3 (add)
    with BuildSketch(Plane(origin=(0, 0, 0), x_dir=(1, 0, 0), z_dir=(0, 0.7071067811865511, 0.7071067811865441)).offset(CHAMFER1_START_3)):
        with BuildLine():
            add(Edge.make_bspline(
                [(24.54362368, -27.110527763), (25.013120861, -22.938783104), (28.000118409, -22.938783104), (30.987115958, -22.938783104), (31.456613139, -27.110527763)],
                knots=[1.72863114, 1.72863114, 1.72863114, 3.141592654, 3.141592654, 4.554554167, 4.554554167, 4.554554167], degree=2, weights=[1, 0.760651137, 1, 0.760651137, 1]))
            Line((24.54362368, -27.110527763), (24.403751541, -29.525423311))
            Line((24.403751541, -29.525423311), (31.596485278, -29.525423311))
            Line((31.596485278, -29.525423311), (31.456613139, -27.110527763))
        make_face()
    extrude(amount=CHAMFER1_3_DEPTH)

    # Sketch9 → Cut-Extrude3 (cut, up to next)
    with BuildSketch(Plane.XY.offset(35.6724529), mode=Mode.PRIVATE) as cut_extrude3_sk1:
        with Locations((28.047527858, -16.709493147)):
            Circle(SKETCH9_R)
    cut_extrude3_tool1 = extrude(cut_extrude3_sk1.sketch, amount=-CUT_EXTRUDE3_REACH, mode=Mode.PRIVATE) & part_5.part
    add(cut_extrude3_tool1.solids().sort_by_distance((28.047528, -16.709493, 35.672453))[0], mode=Mode.SUBTRACT)


solid = part_5.part
